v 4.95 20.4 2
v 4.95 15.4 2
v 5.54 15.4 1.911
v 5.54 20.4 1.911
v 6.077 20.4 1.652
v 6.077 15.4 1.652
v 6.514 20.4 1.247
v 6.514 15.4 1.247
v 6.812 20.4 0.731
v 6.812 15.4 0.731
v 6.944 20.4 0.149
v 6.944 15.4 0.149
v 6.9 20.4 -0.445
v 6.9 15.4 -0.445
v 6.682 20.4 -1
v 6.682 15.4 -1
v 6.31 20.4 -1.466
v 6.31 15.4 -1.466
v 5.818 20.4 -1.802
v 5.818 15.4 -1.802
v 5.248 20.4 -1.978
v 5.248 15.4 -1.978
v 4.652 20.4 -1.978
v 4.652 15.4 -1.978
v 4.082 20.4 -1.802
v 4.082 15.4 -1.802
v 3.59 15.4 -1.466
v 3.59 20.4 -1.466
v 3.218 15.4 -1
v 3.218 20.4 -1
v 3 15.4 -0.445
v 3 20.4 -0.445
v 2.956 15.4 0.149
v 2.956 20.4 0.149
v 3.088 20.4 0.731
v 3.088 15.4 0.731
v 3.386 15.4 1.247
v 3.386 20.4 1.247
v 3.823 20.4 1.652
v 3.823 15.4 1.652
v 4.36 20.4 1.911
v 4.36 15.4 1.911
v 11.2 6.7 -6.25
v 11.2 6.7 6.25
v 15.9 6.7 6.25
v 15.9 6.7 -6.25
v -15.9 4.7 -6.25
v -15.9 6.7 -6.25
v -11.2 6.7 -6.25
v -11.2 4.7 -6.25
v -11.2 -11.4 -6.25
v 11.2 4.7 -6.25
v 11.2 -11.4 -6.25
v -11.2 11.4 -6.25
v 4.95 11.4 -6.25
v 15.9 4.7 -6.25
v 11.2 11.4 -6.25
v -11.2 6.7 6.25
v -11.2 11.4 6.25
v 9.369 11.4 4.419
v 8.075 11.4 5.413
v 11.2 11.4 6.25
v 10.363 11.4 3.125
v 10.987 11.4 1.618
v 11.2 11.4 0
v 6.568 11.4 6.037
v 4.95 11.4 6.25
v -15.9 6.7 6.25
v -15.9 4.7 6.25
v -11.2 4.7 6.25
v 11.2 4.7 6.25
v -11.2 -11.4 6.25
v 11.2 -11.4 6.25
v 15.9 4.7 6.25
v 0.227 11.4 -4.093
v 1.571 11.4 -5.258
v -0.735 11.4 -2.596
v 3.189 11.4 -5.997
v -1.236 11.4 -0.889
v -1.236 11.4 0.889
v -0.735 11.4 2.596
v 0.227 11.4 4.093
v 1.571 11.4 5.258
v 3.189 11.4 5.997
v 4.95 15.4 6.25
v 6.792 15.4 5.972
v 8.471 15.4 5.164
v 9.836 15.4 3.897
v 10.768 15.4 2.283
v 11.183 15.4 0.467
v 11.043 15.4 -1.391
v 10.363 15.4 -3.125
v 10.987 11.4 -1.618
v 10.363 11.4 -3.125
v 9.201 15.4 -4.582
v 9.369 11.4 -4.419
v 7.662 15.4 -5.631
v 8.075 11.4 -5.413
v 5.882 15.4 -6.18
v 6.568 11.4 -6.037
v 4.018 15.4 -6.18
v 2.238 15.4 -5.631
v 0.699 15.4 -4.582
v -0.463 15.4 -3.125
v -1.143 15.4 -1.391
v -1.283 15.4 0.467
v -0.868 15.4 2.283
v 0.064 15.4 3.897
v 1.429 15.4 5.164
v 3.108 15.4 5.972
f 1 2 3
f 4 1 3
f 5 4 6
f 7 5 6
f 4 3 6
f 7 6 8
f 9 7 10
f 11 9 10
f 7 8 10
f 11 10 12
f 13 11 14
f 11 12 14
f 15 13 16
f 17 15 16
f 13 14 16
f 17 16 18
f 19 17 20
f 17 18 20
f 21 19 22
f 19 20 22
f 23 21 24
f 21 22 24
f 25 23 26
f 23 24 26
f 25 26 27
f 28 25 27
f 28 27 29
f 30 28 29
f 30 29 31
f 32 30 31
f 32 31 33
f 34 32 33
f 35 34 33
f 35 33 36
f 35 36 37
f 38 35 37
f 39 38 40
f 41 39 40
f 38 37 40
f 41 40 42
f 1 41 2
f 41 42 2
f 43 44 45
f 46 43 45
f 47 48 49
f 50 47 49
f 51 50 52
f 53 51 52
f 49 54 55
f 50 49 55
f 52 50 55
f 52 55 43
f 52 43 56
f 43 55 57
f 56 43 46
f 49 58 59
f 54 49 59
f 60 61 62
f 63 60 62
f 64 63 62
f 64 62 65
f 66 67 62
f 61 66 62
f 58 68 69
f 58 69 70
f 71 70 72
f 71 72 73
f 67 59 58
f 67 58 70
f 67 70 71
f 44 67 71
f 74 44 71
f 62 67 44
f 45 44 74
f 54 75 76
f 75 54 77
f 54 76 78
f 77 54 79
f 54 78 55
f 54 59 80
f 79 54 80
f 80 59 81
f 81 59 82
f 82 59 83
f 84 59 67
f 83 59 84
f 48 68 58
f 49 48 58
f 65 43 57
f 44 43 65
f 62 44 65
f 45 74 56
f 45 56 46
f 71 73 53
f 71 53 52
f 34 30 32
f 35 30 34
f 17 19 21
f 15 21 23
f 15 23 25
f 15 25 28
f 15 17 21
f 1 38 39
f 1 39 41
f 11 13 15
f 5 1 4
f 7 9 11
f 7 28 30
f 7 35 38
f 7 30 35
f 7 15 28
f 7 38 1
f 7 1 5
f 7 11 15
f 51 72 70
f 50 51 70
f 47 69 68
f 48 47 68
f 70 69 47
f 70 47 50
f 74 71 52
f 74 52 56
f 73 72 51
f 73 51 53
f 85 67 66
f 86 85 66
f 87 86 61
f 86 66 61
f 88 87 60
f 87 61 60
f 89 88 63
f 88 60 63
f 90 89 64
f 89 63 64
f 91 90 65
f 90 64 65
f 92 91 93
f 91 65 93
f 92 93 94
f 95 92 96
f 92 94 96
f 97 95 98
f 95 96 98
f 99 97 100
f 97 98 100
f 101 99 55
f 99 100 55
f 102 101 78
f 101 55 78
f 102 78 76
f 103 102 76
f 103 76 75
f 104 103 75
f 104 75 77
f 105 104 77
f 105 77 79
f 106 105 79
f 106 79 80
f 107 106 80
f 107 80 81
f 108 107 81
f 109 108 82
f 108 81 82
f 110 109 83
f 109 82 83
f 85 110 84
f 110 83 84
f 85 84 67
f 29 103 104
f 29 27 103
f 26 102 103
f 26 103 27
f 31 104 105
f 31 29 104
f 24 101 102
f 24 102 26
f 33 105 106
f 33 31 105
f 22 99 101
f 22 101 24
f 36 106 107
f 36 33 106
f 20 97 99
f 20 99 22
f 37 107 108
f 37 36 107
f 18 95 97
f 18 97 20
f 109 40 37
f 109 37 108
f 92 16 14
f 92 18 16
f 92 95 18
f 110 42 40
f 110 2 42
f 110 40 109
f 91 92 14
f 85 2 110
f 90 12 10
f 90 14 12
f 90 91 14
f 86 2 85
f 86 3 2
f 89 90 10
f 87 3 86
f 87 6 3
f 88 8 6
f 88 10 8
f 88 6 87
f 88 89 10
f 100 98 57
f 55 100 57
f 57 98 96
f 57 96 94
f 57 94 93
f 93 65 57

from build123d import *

# Parameters (mm, degrees)
SKETCH_1_W      = 22.4
SKETCH_1_H      = 22.8
EXTRUDE_1_DEPTH = 6.25
SKETCH_4_W      = 4.7
SKETCH_4_H      = 2
EXTRUDE_2_DEPTH = 12.5
SKETCH_5_R      = 6.25
EXTRUDE_3_DEPTH = 4
SKETCH_6_R      = 2
EXTRUDE_4_DEPTH = 5


with BuildPart() as part:
    # 草图1 → 凸台-拉伸1 (new, symmetric)
    with BuildSketch(Plane.XY):
        Rectangle(SKETCH_1_W, SKETCH_1_H)
    extrude(amount=EXTRUDE_1_DEPTH, both=True)

    # 草图4 → 凸台-拉伸2 (add)
    with BuildSketch(Plane.XY.offset(6.25)):
        with Locations((-13.55, 5.7)):
            Rectangle(SKETCH_4_W, SKETCH_4_H)
        with Locations((13.55, 5.7)):
            Rectangle(SKETCH_4_W, SKETCH_4_H)
    extrude(amount=-EXTRUDE_2_DEPTH)

    # 草图5 → 凸台-拉伸3 (add)
    with BuildSketch(Plane(origin=(0, 11.4, 0), x_dir=(1, 0, 0), z_dir=(0, 1, 0))):
        with Locations(Location((4.95, 0, 0), (0, 0, 270))):
            Circle(SKETCH_5_R)
    extrude(amount=EXTRUDE_3_DEPTH)

    # 草图6 → 凸台-拉伸4 (add)
    with BuildSketch(Plane(origin=(0, 15.4, 0), x_dir=(1, 0, 0), z_dir=(0, 1, 0))):
        with Locations(Location((4.95, 0, 0), (0, 0, 270))):
            Circle(SKETCH_6_R)
    extrude(amount=EXTRUDE_4_DEPTH)


solid = part.part
